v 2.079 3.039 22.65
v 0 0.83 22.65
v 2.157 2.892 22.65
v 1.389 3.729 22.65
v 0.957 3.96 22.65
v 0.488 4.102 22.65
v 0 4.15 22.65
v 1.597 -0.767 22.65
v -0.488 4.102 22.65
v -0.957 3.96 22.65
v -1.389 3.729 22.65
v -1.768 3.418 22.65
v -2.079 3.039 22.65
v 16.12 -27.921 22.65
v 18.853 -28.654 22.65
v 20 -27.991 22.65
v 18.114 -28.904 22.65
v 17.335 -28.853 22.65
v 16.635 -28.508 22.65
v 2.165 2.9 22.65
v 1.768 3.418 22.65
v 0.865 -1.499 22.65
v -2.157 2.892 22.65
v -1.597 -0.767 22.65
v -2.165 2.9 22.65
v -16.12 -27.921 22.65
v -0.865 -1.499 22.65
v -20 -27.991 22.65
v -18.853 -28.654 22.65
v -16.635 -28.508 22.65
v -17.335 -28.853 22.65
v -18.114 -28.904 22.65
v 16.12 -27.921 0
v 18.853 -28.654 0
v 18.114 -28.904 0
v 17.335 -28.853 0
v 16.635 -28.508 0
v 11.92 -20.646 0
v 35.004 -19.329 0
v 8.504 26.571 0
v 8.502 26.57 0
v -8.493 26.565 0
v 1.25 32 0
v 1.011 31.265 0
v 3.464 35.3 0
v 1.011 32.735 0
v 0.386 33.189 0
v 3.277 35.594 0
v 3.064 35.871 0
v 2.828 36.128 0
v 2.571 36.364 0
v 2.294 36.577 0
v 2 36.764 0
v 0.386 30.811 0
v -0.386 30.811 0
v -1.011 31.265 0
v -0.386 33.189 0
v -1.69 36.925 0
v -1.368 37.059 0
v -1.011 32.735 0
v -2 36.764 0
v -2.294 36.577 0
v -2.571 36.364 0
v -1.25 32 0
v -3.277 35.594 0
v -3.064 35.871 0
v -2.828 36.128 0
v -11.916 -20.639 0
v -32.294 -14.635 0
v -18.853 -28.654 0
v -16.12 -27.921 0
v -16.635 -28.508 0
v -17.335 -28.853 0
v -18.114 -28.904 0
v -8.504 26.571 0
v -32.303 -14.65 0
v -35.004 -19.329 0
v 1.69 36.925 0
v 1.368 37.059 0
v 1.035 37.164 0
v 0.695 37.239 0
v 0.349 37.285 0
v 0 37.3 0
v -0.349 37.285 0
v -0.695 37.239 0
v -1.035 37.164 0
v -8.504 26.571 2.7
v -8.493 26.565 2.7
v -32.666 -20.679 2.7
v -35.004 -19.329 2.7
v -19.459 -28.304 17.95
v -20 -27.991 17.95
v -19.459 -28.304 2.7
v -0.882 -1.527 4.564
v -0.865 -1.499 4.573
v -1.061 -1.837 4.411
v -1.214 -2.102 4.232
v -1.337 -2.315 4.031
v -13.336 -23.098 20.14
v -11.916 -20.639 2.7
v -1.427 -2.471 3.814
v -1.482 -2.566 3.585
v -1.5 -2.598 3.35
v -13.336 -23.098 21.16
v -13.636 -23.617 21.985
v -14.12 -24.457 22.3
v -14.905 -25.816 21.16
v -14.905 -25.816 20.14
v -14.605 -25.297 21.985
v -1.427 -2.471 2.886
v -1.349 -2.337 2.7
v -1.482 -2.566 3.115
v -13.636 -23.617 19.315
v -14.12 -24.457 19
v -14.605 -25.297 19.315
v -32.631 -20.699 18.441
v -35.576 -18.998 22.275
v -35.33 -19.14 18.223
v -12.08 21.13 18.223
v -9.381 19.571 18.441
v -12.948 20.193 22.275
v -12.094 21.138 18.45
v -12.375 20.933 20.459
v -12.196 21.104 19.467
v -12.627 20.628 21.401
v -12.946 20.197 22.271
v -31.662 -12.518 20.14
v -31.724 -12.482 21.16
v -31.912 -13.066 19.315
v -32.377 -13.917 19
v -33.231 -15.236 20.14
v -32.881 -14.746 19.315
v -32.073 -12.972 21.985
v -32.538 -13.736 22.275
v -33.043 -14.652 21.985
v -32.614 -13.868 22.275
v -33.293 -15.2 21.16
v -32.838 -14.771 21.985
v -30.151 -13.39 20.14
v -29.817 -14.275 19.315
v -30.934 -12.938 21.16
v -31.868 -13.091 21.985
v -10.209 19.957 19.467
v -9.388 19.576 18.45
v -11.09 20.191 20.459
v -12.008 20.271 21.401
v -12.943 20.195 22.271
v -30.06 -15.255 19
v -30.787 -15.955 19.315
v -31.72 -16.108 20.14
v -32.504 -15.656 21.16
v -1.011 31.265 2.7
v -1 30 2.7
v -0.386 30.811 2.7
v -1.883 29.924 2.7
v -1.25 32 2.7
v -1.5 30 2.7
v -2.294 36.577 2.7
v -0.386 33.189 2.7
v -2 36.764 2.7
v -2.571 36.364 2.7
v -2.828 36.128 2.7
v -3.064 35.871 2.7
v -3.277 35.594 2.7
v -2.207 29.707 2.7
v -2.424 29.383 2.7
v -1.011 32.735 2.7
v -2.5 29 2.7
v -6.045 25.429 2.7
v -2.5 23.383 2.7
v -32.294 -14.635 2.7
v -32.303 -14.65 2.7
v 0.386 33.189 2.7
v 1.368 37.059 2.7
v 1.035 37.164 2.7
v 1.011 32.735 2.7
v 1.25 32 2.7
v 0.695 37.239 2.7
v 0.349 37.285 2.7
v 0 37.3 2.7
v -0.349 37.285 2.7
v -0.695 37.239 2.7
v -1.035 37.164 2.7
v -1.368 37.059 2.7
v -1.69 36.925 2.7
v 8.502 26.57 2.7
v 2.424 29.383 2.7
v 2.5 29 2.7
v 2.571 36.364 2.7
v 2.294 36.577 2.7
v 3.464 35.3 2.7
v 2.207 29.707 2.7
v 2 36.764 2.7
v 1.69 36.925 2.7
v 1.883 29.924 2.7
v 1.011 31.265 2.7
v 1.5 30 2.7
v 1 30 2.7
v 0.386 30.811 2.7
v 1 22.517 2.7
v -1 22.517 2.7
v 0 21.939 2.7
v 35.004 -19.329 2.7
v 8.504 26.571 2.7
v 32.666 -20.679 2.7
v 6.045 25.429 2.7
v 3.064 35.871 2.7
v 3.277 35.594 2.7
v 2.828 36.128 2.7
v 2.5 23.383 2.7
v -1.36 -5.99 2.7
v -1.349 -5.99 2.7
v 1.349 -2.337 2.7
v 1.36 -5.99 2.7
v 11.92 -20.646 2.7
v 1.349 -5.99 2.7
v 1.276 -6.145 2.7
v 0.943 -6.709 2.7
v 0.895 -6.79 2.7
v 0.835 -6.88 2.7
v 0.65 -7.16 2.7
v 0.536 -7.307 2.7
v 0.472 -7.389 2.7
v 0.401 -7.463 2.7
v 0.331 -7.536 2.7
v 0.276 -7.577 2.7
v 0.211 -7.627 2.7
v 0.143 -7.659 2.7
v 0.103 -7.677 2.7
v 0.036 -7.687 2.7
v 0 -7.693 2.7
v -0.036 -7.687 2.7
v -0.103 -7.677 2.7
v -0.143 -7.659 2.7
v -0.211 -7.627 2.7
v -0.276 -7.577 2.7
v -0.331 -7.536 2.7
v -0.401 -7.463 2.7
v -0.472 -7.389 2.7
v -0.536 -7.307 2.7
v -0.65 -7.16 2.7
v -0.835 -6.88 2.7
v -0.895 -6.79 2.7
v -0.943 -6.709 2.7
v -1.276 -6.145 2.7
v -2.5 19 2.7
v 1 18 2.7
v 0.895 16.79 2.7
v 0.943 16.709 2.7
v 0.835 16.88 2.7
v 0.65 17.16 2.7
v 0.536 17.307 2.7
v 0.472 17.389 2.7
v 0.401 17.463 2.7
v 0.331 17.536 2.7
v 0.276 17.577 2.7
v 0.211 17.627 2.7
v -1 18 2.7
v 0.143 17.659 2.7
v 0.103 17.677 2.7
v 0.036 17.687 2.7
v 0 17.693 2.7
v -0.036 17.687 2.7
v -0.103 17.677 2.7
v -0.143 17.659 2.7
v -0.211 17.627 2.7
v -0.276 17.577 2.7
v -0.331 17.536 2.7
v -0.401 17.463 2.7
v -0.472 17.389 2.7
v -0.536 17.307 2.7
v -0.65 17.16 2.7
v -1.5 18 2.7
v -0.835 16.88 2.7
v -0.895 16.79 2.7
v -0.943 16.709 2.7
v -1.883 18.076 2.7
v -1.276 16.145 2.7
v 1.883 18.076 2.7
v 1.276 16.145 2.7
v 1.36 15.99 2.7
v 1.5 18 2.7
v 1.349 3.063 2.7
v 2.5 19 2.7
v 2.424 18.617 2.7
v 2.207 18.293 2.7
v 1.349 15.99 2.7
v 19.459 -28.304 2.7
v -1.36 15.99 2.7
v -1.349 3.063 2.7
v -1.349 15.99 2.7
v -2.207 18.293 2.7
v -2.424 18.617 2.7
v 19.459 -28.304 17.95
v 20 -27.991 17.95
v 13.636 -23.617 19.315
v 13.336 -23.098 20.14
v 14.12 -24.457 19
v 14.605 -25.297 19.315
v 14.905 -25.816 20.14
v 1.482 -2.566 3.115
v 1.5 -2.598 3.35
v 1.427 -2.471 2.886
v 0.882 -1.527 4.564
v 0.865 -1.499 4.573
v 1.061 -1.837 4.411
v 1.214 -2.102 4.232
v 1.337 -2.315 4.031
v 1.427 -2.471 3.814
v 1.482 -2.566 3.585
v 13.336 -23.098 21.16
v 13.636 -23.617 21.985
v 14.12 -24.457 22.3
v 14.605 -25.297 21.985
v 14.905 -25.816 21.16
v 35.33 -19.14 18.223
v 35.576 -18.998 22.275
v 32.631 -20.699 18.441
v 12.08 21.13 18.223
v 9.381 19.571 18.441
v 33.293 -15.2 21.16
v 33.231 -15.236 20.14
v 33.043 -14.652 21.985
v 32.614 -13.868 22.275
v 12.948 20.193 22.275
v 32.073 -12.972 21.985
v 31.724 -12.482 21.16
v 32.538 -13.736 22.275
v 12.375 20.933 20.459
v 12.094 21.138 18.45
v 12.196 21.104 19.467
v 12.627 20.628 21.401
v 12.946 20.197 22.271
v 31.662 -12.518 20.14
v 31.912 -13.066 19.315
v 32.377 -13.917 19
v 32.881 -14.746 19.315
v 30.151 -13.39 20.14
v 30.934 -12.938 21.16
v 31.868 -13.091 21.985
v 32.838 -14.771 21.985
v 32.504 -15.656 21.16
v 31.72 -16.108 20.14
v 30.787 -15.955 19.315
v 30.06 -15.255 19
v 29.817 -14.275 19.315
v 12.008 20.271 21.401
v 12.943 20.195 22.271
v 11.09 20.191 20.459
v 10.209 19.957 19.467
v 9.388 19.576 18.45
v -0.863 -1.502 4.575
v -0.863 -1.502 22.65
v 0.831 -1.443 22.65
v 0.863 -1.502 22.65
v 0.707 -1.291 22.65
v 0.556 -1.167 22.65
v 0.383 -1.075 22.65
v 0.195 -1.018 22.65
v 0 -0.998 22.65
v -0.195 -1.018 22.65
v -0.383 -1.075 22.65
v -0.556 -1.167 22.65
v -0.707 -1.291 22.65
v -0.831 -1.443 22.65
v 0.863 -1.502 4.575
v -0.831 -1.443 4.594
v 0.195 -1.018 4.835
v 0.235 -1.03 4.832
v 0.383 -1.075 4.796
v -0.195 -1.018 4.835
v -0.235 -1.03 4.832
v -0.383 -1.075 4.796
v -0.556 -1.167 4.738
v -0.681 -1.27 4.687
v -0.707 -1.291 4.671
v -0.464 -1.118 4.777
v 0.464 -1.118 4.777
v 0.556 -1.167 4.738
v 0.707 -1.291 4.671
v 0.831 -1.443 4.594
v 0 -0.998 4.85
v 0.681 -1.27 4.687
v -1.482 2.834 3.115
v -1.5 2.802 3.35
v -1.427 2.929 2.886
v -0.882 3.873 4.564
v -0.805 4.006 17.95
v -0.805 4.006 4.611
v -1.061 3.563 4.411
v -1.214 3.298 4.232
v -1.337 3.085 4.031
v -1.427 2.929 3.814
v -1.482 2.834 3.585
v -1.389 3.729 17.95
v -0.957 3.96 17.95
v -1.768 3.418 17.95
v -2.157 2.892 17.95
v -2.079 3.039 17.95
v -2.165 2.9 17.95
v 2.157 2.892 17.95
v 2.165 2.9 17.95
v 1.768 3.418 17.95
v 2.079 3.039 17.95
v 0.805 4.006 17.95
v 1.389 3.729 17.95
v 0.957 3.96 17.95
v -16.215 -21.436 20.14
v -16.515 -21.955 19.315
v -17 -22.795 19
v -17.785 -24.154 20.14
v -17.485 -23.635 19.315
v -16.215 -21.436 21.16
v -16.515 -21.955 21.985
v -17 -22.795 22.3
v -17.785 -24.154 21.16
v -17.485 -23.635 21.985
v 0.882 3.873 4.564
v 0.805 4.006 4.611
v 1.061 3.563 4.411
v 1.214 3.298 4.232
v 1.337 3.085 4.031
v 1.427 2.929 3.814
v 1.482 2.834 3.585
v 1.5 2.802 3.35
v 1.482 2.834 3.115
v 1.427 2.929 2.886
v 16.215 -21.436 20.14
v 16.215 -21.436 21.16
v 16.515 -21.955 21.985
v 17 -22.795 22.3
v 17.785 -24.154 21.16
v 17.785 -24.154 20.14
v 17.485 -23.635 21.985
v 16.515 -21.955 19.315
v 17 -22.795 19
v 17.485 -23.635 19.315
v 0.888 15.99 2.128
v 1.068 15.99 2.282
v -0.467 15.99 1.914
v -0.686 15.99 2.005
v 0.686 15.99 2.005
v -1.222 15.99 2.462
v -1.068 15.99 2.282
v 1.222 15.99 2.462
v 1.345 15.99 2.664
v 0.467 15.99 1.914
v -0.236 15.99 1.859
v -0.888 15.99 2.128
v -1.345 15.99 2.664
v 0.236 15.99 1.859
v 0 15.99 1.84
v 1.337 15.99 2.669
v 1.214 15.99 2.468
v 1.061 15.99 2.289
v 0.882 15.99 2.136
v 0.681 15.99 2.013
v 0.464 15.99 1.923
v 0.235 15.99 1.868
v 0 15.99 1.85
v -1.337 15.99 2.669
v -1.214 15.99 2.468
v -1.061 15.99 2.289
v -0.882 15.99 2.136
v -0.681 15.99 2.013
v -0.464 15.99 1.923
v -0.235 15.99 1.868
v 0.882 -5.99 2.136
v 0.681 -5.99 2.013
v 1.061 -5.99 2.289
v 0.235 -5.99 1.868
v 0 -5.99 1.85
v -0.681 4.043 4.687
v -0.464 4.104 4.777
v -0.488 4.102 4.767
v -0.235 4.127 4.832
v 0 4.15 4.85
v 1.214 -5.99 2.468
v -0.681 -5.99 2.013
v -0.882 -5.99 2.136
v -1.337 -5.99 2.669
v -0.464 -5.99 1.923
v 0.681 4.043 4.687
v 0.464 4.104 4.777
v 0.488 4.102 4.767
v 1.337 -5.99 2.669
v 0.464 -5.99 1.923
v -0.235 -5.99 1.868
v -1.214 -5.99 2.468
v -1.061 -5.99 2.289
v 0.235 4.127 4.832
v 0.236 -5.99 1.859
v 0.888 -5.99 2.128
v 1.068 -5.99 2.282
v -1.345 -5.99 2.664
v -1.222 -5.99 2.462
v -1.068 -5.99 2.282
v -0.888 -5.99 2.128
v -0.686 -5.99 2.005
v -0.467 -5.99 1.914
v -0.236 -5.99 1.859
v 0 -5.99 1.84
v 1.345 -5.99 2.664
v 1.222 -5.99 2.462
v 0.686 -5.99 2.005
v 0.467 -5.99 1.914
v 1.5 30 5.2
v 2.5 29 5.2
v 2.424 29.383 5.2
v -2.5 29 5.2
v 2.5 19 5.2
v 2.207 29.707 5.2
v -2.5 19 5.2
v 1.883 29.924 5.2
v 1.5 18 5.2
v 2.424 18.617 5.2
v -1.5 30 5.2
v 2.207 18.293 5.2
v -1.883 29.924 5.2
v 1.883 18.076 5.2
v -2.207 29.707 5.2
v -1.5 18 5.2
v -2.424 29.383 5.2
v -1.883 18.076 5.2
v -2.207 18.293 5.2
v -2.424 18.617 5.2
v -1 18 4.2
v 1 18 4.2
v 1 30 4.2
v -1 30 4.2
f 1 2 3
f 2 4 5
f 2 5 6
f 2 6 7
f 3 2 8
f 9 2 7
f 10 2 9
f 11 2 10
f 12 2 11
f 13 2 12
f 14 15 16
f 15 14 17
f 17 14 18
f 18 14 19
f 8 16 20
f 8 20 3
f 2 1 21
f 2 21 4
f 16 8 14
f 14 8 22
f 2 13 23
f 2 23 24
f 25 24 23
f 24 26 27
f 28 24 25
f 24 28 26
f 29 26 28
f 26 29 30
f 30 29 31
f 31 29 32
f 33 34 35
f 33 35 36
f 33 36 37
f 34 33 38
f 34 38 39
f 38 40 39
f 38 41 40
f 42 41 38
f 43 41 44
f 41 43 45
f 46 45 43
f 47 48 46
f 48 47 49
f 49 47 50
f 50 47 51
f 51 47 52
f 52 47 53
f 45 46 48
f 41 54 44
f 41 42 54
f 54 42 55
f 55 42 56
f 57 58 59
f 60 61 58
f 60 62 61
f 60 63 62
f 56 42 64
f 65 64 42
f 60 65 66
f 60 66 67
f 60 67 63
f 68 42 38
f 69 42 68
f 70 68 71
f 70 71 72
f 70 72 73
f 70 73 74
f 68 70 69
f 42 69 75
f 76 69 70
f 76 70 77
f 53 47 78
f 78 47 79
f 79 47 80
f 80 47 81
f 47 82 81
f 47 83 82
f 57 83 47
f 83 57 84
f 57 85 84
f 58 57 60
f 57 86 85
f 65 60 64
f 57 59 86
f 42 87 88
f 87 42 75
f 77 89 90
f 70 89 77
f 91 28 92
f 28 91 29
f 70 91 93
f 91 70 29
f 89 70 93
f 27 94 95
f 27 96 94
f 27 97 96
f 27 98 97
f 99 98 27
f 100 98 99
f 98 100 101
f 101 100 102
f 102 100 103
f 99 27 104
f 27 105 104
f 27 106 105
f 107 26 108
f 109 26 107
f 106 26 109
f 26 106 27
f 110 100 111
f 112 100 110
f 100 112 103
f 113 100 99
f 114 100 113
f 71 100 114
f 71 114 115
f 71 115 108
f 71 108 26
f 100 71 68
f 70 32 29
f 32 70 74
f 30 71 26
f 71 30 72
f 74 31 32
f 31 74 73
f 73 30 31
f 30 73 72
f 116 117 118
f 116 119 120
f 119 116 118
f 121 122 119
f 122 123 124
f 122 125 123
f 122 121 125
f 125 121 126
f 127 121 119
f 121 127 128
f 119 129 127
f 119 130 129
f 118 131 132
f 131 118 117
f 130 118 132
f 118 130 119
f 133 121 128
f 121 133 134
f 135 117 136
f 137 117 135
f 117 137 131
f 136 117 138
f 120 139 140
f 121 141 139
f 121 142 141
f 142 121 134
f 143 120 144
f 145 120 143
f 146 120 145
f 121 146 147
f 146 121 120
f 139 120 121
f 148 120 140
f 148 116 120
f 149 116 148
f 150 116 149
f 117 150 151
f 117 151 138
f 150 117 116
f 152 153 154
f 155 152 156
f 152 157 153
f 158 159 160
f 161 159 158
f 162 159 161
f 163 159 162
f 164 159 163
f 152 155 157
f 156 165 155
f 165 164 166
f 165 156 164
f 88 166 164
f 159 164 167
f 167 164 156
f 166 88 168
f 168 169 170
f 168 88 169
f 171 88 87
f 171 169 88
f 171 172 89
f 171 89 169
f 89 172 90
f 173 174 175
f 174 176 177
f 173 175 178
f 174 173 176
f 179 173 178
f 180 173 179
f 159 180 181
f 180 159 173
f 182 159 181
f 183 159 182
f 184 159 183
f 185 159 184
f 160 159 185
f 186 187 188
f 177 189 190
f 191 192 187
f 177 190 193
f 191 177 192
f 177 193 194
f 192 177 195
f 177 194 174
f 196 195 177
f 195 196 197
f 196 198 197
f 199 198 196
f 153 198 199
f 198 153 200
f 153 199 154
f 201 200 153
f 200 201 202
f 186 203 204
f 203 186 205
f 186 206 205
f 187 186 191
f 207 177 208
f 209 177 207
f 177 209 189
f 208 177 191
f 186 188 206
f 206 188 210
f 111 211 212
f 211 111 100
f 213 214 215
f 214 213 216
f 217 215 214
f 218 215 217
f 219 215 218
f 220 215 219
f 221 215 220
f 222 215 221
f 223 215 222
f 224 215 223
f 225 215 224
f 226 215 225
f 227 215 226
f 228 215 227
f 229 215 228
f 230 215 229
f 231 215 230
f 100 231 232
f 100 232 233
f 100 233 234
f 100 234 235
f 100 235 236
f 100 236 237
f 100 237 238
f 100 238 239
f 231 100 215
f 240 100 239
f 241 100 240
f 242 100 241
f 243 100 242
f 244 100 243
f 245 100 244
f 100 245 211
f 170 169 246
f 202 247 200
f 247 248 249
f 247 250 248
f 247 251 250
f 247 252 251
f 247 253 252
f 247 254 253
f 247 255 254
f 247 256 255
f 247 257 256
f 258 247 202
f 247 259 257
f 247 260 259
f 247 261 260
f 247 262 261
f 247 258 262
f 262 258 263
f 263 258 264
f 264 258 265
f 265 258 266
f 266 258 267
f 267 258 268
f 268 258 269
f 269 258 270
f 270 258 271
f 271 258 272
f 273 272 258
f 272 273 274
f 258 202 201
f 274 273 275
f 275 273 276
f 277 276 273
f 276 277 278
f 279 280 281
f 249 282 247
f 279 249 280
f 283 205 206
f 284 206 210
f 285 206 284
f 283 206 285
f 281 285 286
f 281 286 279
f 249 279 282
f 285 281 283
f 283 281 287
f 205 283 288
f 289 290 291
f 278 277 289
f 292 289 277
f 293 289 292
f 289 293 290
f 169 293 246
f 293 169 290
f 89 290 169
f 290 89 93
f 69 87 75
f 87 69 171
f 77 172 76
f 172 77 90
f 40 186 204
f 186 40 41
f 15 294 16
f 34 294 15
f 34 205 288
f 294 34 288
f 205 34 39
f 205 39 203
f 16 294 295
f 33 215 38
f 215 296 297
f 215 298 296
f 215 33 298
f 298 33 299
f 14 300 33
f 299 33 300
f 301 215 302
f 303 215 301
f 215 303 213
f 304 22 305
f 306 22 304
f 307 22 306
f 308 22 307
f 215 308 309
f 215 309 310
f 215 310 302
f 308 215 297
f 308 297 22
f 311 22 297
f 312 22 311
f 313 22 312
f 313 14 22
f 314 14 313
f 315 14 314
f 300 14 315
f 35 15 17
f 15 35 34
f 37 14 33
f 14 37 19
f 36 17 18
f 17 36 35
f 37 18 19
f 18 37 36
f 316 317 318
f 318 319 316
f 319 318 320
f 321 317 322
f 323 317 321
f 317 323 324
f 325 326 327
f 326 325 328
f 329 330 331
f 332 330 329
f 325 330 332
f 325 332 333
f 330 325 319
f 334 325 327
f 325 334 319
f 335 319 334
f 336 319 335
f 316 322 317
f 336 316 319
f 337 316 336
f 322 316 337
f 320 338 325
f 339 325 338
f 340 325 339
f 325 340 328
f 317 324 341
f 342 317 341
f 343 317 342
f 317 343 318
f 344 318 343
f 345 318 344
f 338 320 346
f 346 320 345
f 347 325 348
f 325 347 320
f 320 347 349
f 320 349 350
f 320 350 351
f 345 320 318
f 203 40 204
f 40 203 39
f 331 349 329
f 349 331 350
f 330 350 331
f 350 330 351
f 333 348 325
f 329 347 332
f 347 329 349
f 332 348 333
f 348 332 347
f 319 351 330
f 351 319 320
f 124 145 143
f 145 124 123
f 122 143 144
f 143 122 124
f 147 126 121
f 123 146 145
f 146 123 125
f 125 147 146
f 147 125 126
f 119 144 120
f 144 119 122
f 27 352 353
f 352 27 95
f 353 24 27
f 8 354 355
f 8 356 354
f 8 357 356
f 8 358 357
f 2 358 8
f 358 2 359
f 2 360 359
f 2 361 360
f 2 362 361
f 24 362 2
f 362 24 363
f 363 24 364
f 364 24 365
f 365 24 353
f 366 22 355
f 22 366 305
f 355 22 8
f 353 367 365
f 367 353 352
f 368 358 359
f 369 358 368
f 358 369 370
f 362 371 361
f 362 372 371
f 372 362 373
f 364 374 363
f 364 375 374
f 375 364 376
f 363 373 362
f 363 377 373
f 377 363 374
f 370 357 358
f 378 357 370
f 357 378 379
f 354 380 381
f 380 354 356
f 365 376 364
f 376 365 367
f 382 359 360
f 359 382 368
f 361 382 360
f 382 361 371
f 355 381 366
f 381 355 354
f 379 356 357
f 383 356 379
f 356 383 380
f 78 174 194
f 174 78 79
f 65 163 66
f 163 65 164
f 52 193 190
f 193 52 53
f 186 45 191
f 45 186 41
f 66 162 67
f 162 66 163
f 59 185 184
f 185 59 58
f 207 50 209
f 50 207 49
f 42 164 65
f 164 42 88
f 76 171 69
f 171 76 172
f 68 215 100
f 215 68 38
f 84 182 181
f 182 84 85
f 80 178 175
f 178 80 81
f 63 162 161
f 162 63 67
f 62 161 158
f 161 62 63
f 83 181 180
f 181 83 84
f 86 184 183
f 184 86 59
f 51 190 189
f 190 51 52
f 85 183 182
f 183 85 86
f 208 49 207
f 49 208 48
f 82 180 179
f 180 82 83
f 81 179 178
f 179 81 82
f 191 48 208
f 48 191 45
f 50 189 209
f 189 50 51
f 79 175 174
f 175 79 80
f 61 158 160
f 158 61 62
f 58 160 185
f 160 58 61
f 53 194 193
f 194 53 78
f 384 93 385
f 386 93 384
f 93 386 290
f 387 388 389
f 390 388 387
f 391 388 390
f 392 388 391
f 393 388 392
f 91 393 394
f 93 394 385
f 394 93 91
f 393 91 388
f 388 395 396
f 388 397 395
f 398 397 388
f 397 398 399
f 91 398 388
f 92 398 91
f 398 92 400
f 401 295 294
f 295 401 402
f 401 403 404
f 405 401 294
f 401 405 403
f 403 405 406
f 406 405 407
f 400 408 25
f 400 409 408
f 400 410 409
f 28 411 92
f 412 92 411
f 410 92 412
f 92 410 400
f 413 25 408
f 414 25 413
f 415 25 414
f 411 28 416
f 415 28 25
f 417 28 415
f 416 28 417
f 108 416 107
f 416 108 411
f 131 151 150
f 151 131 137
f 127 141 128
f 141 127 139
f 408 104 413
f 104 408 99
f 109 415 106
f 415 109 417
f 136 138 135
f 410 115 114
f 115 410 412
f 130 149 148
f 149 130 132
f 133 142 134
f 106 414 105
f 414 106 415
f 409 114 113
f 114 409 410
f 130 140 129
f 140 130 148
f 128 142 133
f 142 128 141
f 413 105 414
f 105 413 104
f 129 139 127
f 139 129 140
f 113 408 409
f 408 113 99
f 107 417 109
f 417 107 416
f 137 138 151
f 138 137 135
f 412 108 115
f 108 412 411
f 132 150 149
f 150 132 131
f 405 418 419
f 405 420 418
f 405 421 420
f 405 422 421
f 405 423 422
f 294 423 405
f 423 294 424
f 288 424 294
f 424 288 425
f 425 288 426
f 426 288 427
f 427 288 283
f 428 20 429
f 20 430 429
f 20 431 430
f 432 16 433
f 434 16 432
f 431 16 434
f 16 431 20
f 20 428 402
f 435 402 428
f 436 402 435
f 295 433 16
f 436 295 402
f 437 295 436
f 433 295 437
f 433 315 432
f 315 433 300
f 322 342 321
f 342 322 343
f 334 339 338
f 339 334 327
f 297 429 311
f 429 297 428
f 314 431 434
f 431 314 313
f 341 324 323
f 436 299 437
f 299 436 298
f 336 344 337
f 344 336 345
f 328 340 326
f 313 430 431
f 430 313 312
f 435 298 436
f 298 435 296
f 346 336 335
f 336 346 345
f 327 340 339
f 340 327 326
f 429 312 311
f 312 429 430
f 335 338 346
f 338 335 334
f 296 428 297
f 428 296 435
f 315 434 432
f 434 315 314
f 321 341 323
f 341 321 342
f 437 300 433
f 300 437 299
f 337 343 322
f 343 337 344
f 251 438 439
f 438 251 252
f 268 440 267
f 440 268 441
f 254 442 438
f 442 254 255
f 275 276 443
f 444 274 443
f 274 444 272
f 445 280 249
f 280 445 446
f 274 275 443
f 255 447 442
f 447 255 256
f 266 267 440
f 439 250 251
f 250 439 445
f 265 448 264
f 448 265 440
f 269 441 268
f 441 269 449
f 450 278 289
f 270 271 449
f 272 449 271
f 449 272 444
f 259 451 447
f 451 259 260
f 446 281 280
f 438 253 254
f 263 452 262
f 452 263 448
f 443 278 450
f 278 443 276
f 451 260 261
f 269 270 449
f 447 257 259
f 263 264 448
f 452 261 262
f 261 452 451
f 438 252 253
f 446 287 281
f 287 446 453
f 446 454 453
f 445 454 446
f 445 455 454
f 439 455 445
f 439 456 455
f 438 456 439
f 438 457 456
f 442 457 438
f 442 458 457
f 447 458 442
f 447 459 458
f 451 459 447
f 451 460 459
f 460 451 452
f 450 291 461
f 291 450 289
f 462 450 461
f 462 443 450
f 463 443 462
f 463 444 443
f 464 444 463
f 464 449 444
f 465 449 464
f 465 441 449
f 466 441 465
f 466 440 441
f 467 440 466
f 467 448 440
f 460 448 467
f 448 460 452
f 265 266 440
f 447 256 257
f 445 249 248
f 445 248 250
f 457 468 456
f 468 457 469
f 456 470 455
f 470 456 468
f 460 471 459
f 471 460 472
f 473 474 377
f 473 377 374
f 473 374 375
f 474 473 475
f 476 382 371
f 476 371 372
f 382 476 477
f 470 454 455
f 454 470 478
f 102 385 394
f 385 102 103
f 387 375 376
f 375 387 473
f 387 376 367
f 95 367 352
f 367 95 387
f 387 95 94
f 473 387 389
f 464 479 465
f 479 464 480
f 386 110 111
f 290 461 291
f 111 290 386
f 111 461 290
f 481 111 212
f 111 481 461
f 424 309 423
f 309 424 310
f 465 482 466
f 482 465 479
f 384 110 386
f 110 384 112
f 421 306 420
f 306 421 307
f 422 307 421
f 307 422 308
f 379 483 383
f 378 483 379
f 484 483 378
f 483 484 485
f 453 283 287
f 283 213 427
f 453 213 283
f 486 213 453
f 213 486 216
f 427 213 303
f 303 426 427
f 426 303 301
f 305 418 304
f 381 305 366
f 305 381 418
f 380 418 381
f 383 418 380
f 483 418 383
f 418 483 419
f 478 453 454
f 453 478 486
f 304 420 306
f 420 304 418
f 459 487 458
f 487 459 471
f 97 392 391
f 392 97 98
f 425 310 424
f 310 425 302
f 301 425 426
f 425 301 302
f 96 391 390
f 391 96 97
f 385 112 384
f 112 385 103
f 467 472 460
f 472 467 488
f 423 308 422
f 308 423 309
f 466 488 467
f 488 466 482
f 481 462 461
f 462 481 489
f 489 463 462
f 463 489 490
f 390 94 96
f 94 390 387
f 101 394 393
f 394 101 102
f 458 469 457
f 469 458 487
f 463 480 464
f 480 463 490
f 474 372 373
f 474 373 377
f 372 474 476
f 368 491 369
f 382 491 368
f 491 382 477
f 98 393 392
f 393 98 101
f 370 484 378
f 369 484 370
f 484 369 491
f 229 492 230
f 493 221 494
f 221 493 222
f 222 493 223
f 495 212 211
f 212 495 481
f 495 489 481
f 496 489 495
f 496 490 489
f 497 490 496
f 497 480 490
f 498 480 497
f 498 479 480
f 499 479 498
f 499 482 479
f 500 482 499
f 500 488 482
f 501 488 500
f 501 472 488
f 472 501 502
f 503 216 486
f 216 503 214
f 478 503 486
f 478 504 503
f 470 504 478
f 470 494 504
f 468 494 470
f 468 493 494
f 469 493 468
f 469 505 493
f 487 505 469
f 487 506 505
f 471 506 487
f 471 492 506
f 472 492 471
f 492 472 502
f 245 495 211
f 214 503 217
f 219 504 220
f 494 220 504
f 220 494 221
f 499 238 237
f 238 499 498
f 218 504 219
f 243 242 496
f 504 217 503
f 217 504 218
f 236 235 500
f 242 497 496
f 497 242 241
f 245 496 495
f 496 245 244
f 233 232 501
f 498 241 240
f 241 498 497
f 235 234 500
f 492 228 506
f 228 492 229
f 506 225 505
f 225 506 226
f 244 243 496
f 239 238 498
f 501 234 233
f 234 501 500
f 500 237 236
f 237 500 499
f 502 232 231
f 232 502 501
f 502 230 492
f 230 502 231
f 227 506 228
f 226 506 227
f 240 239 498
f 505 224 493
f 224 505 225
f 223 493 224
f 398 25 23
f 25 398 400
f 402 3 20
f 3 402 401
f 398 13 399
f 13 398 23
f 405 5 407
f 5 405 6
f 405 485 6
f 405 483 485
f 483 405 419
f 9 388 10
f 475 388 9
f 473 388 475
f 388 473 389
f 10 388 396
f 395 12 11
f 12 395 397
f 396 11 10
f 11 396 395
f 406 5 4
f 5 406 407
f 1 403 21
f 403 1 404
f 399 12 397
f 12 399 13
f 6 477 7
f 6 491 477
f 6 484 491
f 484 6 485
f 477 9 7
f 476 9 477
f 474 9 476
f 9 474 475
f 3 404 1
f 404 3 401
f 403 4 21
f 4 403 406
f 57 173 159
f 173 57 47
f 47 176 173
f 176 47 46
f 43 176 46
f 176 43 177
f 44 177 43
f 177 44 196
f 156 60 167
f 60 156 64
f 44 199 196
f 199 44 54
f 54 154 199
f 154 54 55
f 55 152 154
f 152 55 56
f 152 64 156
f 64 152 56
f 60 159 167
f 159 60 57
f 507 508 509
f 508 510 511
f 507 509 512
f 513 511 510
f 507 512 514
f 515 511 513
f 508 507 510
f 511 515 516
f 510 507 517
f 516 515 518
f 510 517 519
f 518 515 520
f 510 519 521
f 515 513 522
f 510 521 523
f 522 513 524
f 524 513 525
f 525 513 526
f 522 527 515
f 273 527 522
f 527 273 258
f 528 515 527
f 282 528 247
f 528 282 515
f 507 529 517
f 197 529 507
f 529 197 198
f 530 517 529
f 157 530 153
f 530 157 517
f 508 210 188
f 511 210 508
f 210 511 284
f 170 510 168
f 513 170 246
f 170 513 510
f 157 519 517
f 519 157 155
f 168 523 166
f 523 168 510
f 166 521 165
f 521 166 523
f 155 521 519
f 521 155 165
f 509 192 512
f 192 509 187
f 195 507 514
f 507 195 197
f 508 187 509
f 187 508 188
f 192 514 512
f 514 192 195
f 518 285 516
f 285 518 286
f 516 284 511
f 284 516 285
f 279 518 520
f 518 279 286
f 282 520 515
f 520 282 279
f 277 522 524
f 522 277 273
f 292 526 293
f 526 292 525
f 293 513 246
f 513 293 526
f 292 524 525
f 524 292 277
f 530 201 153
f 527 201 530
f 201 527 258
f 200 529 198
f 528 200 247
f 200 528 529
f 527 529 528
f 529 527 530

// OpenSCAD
// file: sweep.scad
// sweep.scad
//
// This code is copied from
// https://github.com/openscad/list-comprehension-demos
// and
// https://github.com/openscad/scad-utils
// to make hangprinter repo self-contained
// It was included in order to make the worm drive parametric
// In future OpenSCAD (or other script CAD programs)
// worm drives should be will be more easily constructed without
// this user space defined sweep operation.
// See OpenSCAD discussion at:
// https://github.com/openscad/openscad/issues/114

// Look into files
// lists.scad
// X transformations.scad
// linalg.scad
// se3.scad
// so3.scad


// Include modules and fcts:

/// linalg.scad
function vec3(p) = len(p) < 3 ? concat(p,0) : p;
function vec4(p) = let (v3=vec3(p)) len(v3) < 4 ? concat(v3,1) : v3;
function take3(v) = [v[0],v[1],v[2]];
function tail3(v) = [v[3],v[4],v[5]];
function construct_Rt(R,t) = [concat(R[0],t[0]),concat(R[1],t[1]),concat(R[2],t[2]),[0,0,0,1]];

/// so3.scad

function se3_exp_2(t,w) = se3_exp_2_0(t,w,w*w);
function se3_exp_2_0(t,w,theta_sq) =
se3_exp_23(
	so3_exp_2(theta_sq),
	C = (1.0 - theta_sq/20) / 6,
	t=t,w=w);

// Taylor series expansions close to 0
function so3_exp_1(theta_sq) = [
	1 - 1/6*theta_sq,
	0.5
];

function rodrigues_so3_exp(w, A, B) = [
  [1.0 - B*(w[1]*w[1] + w[2]*w[2]), B*(w[0]*w[1]) - A*w[2],          B*(w[0]*w[2]) + A*w[1]],
  [B*(w[0]*w[1]) + A*w[2],          1.0 - B*(w[0]*w[0] + w[2]*w[2]), B*(w[1]*w[2]) - A*w[0]],
  [B*(w[0]*w[2]) - A*w[1],          B*(w[1]*w[2]) + A*w[0],          1.0 - B*(w[0]*w[0] + w[1]*w[1])]
];

function so3_exp_3_0(theta_deg, inv_theta) = [
	sin(theta_deg) * inv_theta,
	(1 - cos(theta_deg)) * (inv_theta * inv_theta)
];

/// se3.scad
function combine_se3_exp(w, ABt) = construct_Rt(rodrigues_so3_exp(w, ABt[0], ABt[1]), ABt[2]);
function se3_exp_1(t,w) = concat(
	so3_exp_1(w*w),
	[t + 0.5 * cross(w,t)]
);

function se3_exp_3(t,w) = se3_exp_3_0(t,w,sqrt(w*w)*180/PI,1/sqrt(w*w));

function se3_exp_23(AB,C,t,w) =
[AB[0], AB[1], t + AB[1] * cross(w,t) + C * cross(w,cross(w,t)) ];

function se3_exp_3_0(t,w,theta_deg,inv_theta) =
se3_exp_23(
	so3_exp_3_0(theta_deg = theta_deg, inv_theta = inv_theta),
	C = (1 - sin(theta_deg) * inv_theta) * (inv_theta * inv_theta),
t=t,w=w);

function se3_exp(mu) = se3_exp_0(t=take3(mu),w=tail3(mu)/180*PI);

function se3_exp_0(t,w) =
combine_se3_exp(w,
// Evaluate by Taylor expansion when near 0
	w*w < 1e-8
	? se3_exp_1(t,w)
	: w*w < 1e-6
	  ? se3_exp_2(t,w)
	  : se3_exp_3(t,w)
);


/// lists.scad
/*!
  Flattens a list one level:

  flatten([[0,1],[2,3]]) => [0,1,2,3]
*/
function flatten(list) = [ for (i = list, v = i) v ];
/*!
  Extracts a subarray from index begin (inclusive) to end (exclusive)

  subarray([1,2,3,4], 1, 2) => [2,3]
*/
function subarray(list,begin=0,end=-1) = [
    let(end = end < 0 ? len(list) : end)
      for (i = [begin : 1 : end-1])
        list[i]
];

/// transformations.scad
//********* Create modifying matrices ***************//
/*!
  Creates a rotation matrix

  xyz = euler angles = rz * ry * rx
  axis = rotation_axis * rotation_angle
*/
function rotation(xyz=undef, axis=undef) =
	xyz != undef && axis != undef ? undef :
	xyz == undef  ? se3_exp([0,0,0,axis[0],axis[1],axis[2]]) :
	len(xyz) == undef ? rotation(axis=[0,0,xyz]) :
	(len(xyz) >= 3 ? rotation(axis=[0,0,xyz[2]]) : identity4()) *
	(len(xyz) >= 2 ? rotation(axis=[0,xyz[1],0]) : identity4()) *
(len(xyz) >= 1 ? rotation(axis=[xyz[0],0,0]) : identity4());

/*!
  Creates a scaling matrix
*/
function scaling(v) = [
	[v[0],0,0,0],
	[0,v[1],0,0],
	[0,0,v[2],0],
	[0,0,0,1],
];

/*!
  Creates a translation matrix
*/
function translation(v) = [
	[1,0,0,v[0]],
	[0,1,0,v[1]],
	[0,0,1,v[2]],
	[0,0,0,1],
];


function project(x) = subarray(x,end=len(x)-1) / x[len(x)-1];

function transform(m, list) = [for (p=list) project(m * vec4(p))];

function to_3d(list) = [ for(v = list) vec3(v) ];

module sweep(shape, path_transforms, closed=false) {

    pathlen = len(path_transforms);
    segments = pathlen + (closed ? 0 : -1);
    shape3d = to_3d(shape);

    function sweep_points() =
      flatten([for (i=[0:pathlen-1])
        transform(path_transforms[i], shape3d)]);

    function loop_faces() = [let (facets=len(shape3d))
        for(s=[0:segments-1], i=[0:facets-1])
          [(s%pathlen) * facets + i,
           (s%pathlen) * facets + (i + 1) % facets,
           ((s + 1) % pathlen) * facets + (i + 1) % facets,
           ((s + 1) % pathlen) * facets + i]];

    bottom_cap = closed ? [] : [[for (i=[len(shape3d)-1:-1:0]) i]];
    top_cap = closed ? [] : [
      [for (i=[0:len(shape3d)-1])
        i+len(shape3d)*(pathlen-1)]];
    polyhedron(points = sweep_points(),
               faces  = concat(loop_faces(),
                               bottom_cap,
                               top_cap),
               convexity=5);
}
// file: parameters.scad
// Parameters shared between modules

Beam_width = 15;
Wiggle = 0.25;
Fat_beam_width = Beam_width + Wiggle;
Beam_length = 400;
Wall_th = 2.5;
Nema17_cube_width          = 42.43;
Nema17_screw_hole_width    = 43.74; // Opposite corner screws
Nema17_ring_diameter       = 22;
Nema17_cube_height         = 39.36;
Nema17_shaft_height        = 63.65;
Nema17_ring_height         = 2;
Nema17_screw_hole_width    = 43.74; // Opposite corner screws
Nema17_shaft_radius        = 5/2;

b608_outer_dia = 22.2;
b608_width = 7.05;

Gap_between_sandwich_and_plate = 1.7;

Clamp_wall_extra_length = 4.5;
Clamp_wall_flex_factor = 1.5;
// main file
include <parameters.scad>
use <sweep.scad>
use <util.scad>

corner_clamp();
module corner_clamp(){
  wall_th = Wall_th+0.2; // A tad thicker since flex is very unwanted in this piece
  rad_b = 4;
  a = 13;
  b = Fat_beam_width+wall_th+2-a/2;
  l0 = 40;
  l1 = (Fat_beam_width+2*wall_th)*2*sqrt(3);
  edges = 0.625;
  opening_width = Fat_beam_width - 2*edges;
  d_hole_l = l0/2+2;

  difference(){
    union(){
      translate([-l1/2,-l1/sqrt(12),0])
      linear_extrude(height=wall_th)
        polygon(points = my_rounded_eqtri(l1,rad_b,5));
      difference(){
        for(k=[0,1])
          mirror([k,0,0])
            rotate([0,0,-30]){
              translate([-(Fat_beam_width+wall_th)+1, -l0+(wall_th+edges)*sqrt(3), 0]){
                one_rounded_cube4([Fat_beam_width+wall_th-1, l0+a, Fat_beam_width+2*wall_th+2],
                    2, $fn=4*4);
                translate([-wall_th-1,0,0])
                  cube([2*wall_th, l0+a, wall_th]);

               translate([Fat_beam_width/2-1, 0, Fat_beam_width/2+wall_th])
                 rotate([0,-90,-90])
                 clamp_wall(l0+a, lift_tri=1.0, w=Fat_beam_width+2*wall_th, edge=edges);

                }
              }

        extra_height_to_diff_of_clamp_wall = 2.30;
        for(k=[0,1])
          mirror([k,0,0])
        rotate([0,-90,30])
          translate([wall_th+a/2,(wall_th+edges)*sqrt(3)+a,-Fat_beam_width-2*wall_th-1]){
            cylinder(r=a/2, h=wall_th+edges+2, $fn=4*10);
            rotate([0,0,2*90])
            translate([-Fat_beam_width-wall_th-2-extra_height_to_diff_of_clamp_wall+a/2,+a/2,-1]){
              inner_round_corner(r=a/2, h=wall_th+edges+2,back=10, $fn=4*10);
              translate([extra_height_to_diff_of_clamp_wall,-b,0])
                cube([b,b, wall_th+edges+2+Clamp_wall_extra_length]);
            }
          }
      }
      translate([0,-sqrt(2)/sqrt(5),wall_th])
        rotate([0,0,-90-45])
        inner_round_corner(1,Fat_beam_width+wall_th+2,120,1.0, $fn=4*8);
    }
    scrw_fr_edg = 6;
    for(k=[0,1])
      mirror([k,0,0])
        rotate([0,0,-30]){
          translate([-Fat_beam_width-wall_th, -l0+4, wall_th])
            cube([Fat_beam_width, l0+a+2, Fat_beam_width]);
          translate([-opening_width-wall_th-edges, -l0+4, wall_th])
            cube([opening_width, l0+a+2, Fat_beam_width+20]);
          translate([0,0,Fat_beam_width+2*wall_th+2-2])
            rotate([0,-90,0])
              translate([0,-l0+(wall_th+edges)*sqrt(3)+scrw_fr_edg,-2])
                cylinder(d=3.3, h=Fat_beam_width+2*wall_th+4, $fn=10);
        }
    translate([0,l0-2*rad_b,-1])
      cylinder(d=2.5, h=wall_th+2, $fn=10);


    translate([0,0,-0.5])
    linear_extrude(height=1)
      scale(0.15)
      mirror([1,0])
      translate([-150.3,-114])
      import("logo.dxf");

    d_hole_r = 1.5;
    translate([0,-6,2+wall_th/2])
      rotate([-90,0,0]){
        translate([0,0,d_hole_l-0.01])
            rotate([0,0,45])
          cylinder(r1=d_hole_r+0.01, r2=0.5, h=2,$fn=40);
            rotate([0,0,45])
        cylinder(r=d_hole_r, h=d_hole_l,$fn=40);
        translate([0,0,-2+0.01])
            rotate([0,0,45])
          cylinder(r2=d_hole_r+0.01, r1=0.5, h=2,$fn=40);
      }
    fillet_r = 2.5;
    translate([0,(wall_th+edges-fillet_r)*2,0]){
      rotate([0,0,-90-45])
        translate([-fillet_r, -fillet_r,wall_th])
          translate([fillet_r*(1-cos(15)),fillet_r*(1-cos(15)),0])
            inner_round_corner(fillet_r,30,120,2, $fn=4*8);
    }
  }

  // Channel to guide D-line and stiffen up corner
  channel_l = ((l0-2*rad_b)+(d_hole_l-6))/4;
  channel_r1 = 1;
  channel_r2 = 2.5;
  translate([0,((l0-2*rad_b)+(d_hole_l-6))/2,wall_th])
    rotate([90,0,0])
        difference(){
          rotate([90,0,0])
            translate([-channel_r2, -channel_l/2, -channel_r2])
              rounded_cube2([2*channel_r2, channel_l, channel_r2+0.1], 1, $fn=4*4);
          rotate([90,0,0])
            translate([-channel_r1, -channel_l/2-1, -channel_r1-0.5])
             cube([2*channel_r1, channel_l+2, 2*channel_r1]);
        }
}
